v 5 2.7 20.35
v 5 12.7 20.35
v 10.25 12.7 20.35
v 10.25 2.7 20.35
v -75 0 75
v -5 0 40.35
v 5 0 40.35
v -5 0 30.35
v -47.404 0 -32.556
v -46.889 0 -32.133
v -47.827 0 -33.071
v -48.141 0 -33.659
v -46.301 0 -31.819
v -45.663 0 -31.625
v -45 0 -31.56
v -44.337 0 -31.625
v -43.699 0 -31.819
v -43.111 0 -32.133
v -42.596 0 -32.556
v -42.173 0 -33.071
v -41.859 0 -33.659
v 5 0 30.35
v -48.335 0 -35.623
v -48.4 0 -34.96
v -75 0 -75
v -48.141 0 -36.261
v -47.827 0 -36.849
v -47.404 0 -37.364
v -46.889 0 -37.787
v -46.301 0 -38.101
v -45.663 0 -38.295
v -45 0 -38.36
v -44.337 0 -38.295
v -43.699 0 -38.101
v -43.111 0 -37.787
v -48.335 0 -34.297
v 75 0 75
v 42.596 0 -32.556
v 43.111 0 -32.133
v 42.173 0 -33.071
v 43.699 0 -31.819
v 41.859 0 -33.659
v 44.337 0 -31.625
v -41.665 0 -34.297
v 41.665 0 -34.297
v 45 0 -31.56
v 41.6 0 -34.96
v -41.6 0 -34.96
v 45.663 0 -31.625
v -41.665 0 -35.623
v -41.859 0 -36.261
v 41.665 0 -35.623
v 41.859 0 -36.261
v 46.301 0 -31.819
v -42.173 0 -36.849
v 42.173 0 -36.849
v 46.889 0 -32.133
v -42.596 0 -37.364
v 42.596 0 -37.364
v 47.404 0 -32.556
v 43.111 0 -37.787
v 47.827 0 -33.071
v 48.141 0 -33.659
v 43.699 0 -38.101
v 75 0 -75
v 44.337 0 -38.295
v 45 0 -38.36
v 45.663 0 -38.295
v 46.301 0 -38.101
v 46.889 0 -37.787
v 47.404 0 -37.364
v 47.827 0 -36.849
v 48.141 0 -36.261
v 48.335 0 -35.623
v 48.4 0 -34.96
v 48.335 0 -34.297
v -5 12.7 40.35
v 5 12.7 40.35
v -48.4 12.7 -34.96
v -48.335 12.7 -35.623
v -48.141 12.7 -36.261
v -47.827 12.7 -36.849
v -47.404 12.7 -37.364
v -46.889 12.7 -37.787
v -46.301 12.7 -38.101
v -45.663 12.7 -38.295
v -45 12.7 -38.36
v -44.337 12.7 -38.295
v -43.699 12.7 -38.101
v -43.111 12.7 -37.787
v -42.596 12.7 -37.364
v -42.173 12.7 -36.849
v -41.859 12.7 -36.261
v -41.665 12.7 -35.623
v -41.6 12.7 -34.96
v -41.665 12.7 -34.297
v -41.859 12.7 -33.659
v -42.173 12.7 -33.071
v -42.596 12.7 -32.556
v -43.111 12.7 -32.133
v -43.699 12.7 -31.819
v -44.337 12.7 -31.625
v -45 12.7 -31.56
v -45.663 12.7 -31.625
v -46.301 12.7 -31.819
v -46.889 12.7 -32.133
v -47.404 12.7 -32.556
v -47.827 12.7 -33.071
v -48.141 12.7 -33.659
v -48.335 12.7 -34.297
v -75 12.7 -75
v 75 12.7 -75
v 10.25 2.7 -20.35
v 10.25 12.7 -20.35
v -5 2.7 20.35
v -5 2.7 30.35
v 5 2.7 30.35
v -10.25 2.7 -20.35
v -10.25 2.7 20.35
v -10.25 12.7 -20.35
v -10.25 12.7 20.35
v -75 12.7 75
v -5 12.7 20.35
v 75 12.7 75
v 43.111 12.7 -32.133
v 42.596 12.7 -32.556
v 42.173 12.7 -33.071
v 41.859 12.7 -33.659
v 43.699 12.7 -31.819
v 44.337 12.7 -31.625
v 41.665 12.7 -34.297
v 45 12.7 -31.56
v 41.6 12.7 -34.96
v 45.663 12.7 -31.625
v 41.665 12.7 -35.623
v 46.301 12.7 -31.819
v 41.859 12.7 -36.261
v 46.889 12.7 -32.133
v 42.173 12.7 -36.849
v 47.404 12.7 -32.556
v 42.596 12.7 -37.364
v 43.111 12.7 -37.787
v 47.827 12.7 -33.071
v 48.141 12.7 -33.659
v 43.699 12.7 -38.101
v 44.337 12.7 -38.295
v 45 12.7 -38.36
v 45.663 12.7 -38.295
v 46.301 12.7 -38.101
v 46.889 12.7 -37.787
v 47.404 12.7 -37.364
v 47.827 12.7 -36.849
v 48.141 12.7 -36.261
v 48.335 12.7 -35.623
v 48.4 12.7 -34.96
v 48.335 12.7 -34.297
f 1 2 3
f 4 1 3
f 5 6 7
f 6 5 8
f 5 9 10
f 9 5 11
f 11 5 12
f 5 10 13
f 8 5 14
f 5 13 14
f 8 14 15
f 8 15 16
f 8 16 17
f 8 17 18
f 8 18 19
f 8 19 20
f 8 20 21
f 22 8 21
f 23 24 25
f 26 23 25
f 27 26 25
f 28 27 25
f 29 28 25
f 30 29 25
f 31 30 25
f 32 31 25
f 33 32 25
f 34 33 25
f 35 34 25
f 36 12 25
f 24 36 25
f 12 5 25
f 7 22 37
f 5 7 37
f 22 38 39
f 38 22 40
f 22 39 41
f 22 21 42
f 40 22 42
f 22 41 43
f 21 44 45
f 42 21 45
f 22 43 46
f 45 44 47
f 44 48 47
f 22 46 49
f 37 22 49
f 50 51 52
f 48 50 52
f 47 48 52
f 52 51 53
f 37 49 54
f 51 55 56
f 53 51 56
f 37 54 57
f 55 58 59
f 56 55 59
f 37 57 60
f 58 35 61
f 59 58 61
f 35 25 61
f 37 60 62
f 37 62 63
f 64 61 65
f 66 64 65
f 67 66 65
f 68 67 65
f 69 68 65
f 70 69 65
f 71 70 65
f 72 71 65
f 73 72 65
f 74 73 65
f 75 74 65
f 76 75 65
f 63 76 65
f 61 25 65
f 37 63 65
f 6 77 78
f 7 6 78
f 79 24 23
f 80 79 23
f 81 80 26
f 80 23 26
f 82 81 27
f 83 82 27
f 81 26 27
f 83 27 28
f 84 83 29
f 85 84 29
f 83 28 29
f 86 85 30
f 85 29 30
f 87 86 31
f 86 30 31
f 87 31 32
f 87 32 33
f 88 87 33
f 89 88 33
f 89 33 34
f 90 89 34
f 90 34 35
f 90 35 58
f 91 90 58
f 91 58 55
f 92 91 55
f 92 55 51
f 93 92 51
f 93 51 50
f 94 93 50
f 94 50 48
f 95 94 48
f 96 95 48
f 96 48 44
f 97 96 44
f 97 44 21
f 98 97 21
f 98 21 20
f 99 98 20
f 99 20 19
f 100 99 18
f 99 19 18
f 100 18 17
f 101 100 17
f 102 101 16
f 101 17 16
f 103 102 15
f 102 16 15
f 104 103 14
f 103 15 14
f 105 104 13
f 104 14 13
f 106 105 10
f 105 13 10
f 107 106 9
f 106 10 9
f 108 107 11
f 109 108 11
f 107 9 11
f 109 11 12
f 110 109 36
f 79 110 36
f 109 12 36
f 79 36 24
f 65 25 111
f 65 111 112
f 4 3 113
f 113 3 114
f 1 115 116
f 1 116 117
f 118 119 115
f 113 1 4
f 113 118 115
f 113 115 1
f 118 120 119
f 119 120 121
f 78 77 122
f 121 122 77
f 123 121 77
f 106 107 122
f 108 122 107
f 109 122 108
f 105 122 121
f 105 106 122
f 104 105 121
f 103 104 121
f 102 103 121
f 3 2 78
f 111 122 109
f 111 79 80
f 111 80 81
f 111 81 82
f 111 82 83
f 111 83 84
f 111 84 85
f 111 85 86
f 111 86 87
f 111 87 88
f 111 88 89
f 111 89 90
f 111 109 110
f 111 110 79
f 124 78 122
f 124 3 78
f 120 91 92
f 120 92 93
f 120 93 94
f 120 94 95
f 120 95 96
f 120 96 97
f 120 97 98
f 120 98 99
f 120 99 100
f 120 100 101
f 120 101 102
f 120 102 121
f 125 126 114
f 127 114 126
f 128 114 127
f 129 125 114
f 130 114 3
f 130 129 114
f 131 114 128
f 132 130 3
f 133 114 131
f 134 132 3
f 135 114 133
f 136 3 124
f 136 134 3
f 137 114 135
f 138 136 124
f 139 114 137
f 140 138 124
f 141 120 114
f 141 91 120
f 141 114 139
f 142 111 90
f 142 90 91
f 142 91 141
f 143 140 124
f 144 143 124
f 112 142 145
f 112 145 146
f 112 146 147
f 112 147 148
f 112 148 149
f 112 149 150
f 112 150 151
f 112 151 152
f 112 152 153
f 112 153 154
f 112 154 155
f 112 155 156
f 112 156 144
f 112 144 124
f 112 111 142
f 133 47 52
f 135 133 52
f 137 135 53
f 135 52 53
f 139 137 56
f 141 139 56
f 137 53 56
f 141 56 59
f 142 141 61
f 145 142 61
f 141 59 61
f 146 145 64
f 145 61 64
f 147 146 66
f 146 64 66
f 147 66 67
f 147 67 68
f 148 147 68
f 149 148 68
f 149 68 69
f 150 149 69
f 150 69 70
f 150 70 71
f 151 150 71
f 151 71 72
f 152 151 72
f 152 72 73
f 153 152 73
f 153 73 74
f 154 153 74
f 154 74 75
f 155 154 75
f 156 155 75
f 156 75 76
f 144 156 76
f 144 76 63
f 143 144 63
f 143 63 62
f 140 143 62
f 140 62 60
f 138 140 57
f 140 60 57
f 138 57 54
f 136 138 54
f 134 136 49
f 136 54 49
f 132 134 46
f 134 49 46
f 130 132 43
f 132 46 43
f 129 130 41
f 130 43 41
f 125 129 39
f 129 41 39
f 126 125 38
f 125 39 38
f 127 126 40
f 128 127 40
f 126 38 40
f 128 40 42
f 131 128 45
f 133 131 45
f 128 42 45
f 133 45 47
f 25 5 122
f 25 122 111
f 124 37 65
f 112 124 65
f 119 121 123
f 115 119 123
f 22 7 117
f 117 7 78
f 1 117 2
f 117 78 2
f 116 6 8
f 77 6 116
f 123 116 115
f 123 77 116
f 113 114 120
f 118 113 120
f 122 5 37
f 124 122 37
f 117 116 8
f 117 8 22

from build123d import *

# Parameters (mm, degrees)
ESBO_O1_W                = 150
ESBO_O1_H                = 150
RESSALTO_EXTRUS_O2_DEPTH = 12.7
CORTE_EXTRUS_O1_DEPTH    = 10
ESBO_O4_W                = 10
ESBO_O4_H                = 10
CORTE_EXTRUS_O2_DEPTH    = 107.823639706
ESBO_O5_R                = 3
CORTE_EXTRUS_O3_DEPTH    = 12.7
FURO_ROSCADO_DE_M83_D    = 6.8


with BuildPart() as part:
    # Esboço1 → Ressalto-extrusão2 (new body)
    with BuildSketch(Plane(origin=(0, 0, 0), x_dir=(1, 0, 0), z_dir=(0, 1, 0))):
        Rectangle(ESBO_O1_W, ESBO_O1_H)
    extrude(amount=RESSALTO_EXTRUS_O2_DEPTH)

    # Esboço2 → Corte-extrusão1 (cut)
    with BuildSketch(Plane(origin=(0, 12.7, 0), x_dir=(1, 0, 0), z_dir=(0, 1, 0))):
        Polygon((10.25, -20.35), (10.25, 20.35), (-10.25, 20.35), (-10.25, -20.35), (-5, -20.35), (-5, -30.35), (5, -30.35), (5, -20.35), align=None)
    extrude(amount=-CORTE_EXTRUS_O1_DEPTH, mode=Mode.SUBTRACT)

    # Esboço4 → Corte-extrusão2 (cut, through all)
    with BuildSketch(Plane(origin=(0, 12.7, 0), x_dir=(1, 0, 0), z_dir=(0, 1, 0))):
        with Locations((0, -35.35)):
            Rectangle(ESBO_O4_W, ESBO_O4_H)
    extrude(amount=-CORTE_EXTRUS_O2_DEPTH, mode=Mode.SUBTRACT)

    # Esboço5 → Corte-extrusão3 (cut)
    with BuildSketch(Plane(origin=(0, 0, 0), x_dir=(-1, 0, 0), z_dir=(0, -1, 0))):
        with Locations(Location((-45, 34.96, 0), (0, 0, 90))):
            Circle(ESBO_O5_R)
        with Locations(Location((45, 34.96, 0), (0, 0, 90))):
            Circle(ESBO_O5_R)
    extrude(amount=-CORTE_EXTRUS_O3_DEPTH, mode=Mode.SUBTRACT)

    # Furo roscado de M83 (through all)
    with Locations(Plane(origin=(0, 12.7, 0), x_dir=(1, 0, 0), z_dir=(0, 1, 0))):
        with Locations((45, 34.96), (-45, 34.96)):
            Hole(FURO_ROSCADO_DE_M83_D / 2)


solid = part.part
